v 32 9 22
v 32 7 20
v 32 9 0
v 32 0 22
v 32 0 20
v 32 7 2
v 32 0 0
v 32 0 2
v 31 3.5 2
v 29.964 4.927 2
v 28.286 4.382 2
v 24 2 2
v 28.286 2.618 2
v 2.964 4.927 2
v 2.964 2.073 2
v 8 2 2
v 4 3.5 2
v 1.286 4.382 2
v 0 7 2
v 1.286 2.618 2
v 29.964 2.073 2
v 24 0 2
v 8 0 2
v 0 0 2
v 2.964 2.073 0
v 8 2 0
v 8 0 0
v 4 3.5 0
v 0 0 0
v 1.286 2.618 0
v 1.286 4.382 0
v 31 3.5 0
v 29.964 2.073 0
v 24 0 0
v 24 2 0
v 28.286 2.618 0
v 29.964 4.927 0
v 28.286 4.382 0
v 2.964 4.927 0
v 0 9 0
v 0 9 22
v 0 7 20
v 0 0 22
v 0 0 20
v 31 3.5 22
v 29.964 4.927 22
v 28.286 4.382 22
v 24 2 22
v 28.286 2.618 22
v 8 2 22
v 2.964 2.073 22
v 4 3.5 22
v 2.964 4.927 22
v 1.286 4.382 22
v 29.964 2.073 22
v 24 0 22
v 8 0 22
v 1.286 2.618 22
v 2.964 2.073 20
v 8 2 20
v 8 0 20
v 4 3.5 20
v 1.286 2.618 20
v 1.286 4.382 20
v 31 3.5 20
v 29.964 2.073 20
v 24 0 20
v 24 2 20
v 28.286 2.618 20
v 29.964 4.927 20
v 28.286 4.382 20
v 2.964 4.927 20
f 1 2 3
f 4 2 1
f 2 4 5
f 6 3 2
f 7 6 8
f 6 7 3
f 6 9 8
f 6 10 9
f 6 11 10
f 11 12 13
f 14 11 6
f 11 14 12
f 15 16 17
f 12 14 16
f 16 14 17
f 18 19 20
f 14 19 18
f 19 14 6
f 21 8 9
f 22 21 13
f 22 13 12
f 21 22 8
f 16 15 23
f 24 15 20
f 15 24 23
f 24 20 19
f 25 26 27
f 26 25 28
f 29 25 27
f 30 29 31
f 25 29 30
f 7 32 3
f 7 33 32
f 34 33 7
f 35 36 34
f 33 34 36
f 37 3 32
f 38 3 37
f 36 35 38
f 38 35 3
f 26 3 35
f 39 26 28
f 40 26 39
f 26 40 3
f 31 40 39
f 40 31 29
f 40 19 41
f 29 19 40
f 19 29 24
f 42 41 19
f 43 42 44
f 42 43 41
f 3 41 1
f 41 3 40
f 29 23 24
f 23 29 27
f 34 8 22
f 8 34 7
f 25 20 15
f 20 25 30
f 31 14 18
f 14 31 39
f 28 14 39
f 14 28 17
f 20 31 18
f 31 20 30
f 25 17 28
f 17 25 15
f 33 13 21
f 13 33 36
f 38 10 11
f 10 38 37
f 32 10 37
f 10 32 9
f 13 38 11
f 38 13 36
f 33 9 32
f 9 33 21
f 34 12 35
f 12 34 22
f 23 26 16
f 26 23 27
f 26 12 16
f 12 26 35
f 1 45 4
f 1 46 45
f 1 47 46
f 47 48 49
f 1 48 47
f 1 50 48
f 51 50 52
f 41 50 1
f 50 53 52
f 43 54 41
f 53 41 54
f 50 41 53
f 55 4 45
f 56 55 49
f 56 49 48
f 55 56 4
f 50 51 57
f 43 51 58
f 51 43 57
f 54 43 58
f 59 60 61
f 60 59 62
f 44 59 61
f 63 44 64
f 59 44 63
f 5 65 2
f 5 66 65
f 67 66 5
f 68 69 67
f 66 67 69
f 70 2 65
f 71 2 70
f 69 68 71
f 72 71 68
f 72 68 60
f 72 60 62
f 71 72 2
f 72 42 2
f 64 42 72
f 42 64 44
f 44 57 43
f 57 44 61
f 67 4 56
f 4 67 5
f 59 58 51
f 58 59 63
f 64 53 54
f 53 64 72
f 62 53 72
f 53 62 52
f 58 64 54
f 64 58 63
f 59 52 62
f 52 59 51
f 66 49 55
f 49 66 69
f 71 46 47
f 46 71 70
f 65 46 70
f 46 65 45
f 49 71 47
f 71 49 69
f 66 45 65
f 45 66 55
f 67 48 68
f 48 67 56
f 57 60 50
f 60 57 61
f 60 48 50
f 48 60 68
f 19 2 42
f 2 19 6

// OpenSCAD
union(){
    difference(){
        cube([32,9,2]);
        translate([2.5,3.5,0]){
            cylinder(r=1.5,h=6); 
        }
        translate([29.5,3.5,0]){
            cylinder(r=1.5,h=6); 
        }
        translate([8,0,0]){
            cube([16,2,2]);
        }
    }
    translate([0,0,20]){
        difference(){
            cube([32,9,2]);
            translate([2.5,3.5,0]){
                cylinder(r=1.5,h=6); 
            }
            translate([29.5,3.5,0]){
                cylinder(r=1.5,h=6); 
            }
            translate([8,0,0]){
                cube([16,2,2]);
            }
        }
    }
    translate([0,7,0]){
        cube([32,2,20]);
    }
}
